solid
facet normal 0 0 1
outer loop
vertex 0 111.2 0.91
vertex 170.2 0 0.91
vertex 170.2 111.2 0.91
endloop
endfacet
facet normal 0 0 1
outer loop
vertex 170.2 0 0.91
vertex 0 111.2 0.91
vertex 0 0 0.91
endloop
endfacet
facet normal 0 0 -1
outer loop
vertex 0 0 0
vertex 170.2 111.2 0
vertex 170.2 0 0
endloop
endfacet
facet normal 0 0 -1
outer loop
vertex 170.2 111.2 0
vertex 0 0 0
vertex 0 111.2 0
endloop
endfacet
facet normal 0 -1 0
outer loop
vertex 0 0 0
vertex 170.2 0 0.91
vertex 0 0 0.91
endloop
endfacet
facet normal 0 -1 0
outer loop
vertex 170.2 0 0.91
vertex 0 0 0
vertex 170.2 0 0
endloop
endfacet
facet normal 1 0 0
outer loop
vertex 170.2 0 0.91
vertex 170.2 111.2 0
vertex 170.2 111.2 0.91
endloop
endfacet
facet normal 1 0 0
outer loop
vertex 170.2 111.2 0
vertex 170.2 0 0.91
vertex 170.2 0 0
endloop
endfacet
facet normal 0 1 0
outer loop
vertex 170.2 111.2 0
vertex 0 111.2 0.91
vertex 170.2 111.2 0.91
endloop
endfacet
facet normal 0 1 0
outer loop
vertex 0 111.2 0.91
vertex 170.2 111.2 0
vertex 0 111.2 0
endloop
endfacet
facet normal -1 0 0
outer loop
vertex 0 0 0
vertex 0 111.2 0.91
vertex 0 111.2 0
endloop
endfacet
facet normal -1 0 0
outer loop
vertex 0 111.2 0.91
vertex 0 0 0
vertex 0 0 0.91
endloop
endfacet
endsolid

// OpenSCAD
// file: common.scad
include	<../common/constants.scad>

// A(x0, y0), B(x1, y1), C(x2, y2) 에서 A와 직선 BC 사이 거리 계산
function pointToLineDistance(x0, y0, x1, y1, x2, y2) =
    abs((x2 - x1)*(y1 - y0) - (x1 - x0)*(y2 - y1)) /
    sqrt((x2 - x1)*(x2 - x1) + (y2 - y1)*(y2 - y1));

module hr() {
	echo(HR);
}
module arrow_left(v) {
	leader = v.y / 32;	//	지시선 두께
	polygon([
		[0, 0],
		[leader, 0],
		[leader, v.y],
		[0, v.y]
	]);

	shaft = v.y / 24;	//	화살대 두께
	polygon([
		[0,		v.y / 2],
		[v.y,	0],
		[v.y,	v.y / 2 - shaft],
		[v.y,	v.y / 2 + shaft],
		[v.y,	v.y],

		[v.x,	v.y / 2 - shaft],
		[v.x,	v.y / 2 + shaft]
	],
	paths=[[0, 1, 2, 5, 6, 3, 4]]);
}
module arrow_right(v) {
	translate(v)
	rotate([0, 0, 180])
	arrow_left(v);
}
module arrow_up(v) {
	translate([0, v.y])
	rotate([0, 0, -90])
	arrow_left([v.y, v.x]);
}
module arrow_down(v) {
	translate([v.x, 0])
	rotate([0, 0, 90])
	arrow_left([v.y, v.x]);
}

module notateHI(v, title) {
	titleSize = v.y * len(title);

	arrow_left([(v.x - titleSize) / 2, v.y]);

	translate([v.x - (v.x - titleSize) / 2, 0])
	arrow_right([(v.x - titleSize) / 2, v.y]);

	translate([v.x / 2, 0])
	text(title, font = "D2Coding", size = v.y, halign = "center");
}
module notateHO(v, title) {
	titleSize = v.y * len(title);
	arrowSize = v.y * 3;

	translate([-arrowSize, 0])
	arrow_right([arrowSize, v.y]);

	translate([v.x, 0])
	arrow_left([arrowSize, v.y]);

	translate([v.x / 2, 0])
	text(title, font = "D2Coding", size = v.y, halign = "center");
}
module notateH(v, title, up, prefix) {
	prefixSafe = is_undef(prefix) ? "" : prefix;
	titleDetail = is_undef(title) ? str(prefixSafe, v.x, "mm") : title;
	titleShort = is_undef(title) ? str(prefixSafe, v.x) : title;
	titleDetailSize = v.y * len(titleDetail);
	titleShortSize = v.y * len(titleShort);
	
	arrowSize = v.y * 3;

	titleSafe = is_undef(title) ? str(v.x) : title;
	upSafe = is_undef(up) ? true : false;
	%linear_extrude(height = EPSILON) {
		if (v.x >= (arrowSize * 2 + titleDetailSize)) {
			// 화살표, 단위까지 충분히 들어간다
			notateHI(v, titleDetail);
		} else if (v.x >= (arrowSize * 2 + titleShortSize)) {
			// 화살표는 들어갈 수 있으나, 단위까지는 못 들어간다
			notateHI(v, titleShort);
		} else if (v.x >= titleDetailSize) {
			//	화살표는 못들어가나, 단위는 들어간다
			notateHO(v, titleDetail);
		} else if (v.x >= titleShortSize) {
			//	화살표는 못들어가나, 수치는 들어간다
			notateHO(v, titleShort);
		} else {
			// 바깥에 표시해야 한다
			notateHO(v, "");
			if (upSafe) {
				translate([v.x / 2, v.y])
				text(titleDetail, font = "D2Coding", size = v.y, halign = "center");
			} else {
				translate([v.x / 2, -v.y])
				text(titleDetail, font = "D2Coding", size = v.y, halign = "center");
			}
		}
	}
}
module notateV(v, title, up, prefix) {
	translate([v.x, 0])
	rotate([0, 0, 90])
	notateH([v.y, v.x], title, up, prefix);
}
module notate(v, title, up, prefix) {
//	echo(str(parent_module(0), ".", parent_module(1), "(", v, title, up, prefix, ")"));

	assert(!is_undef(v));
	assert(!is_undef(v[1]));

	if (v.x > v.y) {
		notateH(v, title, up, prefix);
	} else {
		notateV(v, title, up, prefix);
	}
}
module test() {
	// 테스트
	x0 = 2; y0 = 2;    // 점 A
	x1 = 0; y1 = 0;    // 점 B
	x2 = 4; y2 = 0;    // 점 C

	distance = pointToLineDistance(x0, y0, x1, y1, x2, y2);
	hr();
	echo("A에서 BC까지의 거리: ", distance);
	hr();
}
module main() {
	SHORT = 20;
	//notate([32, 16], str(32, "mm"));
	//notateH([3, 4]);
	notate([13, 4]);
	arrow_left([8, 2]);

	test();
}

main();
// file: ../common/constants.scad
// 상수들 정의
// include 사용하시오
MAX = [220, 220, 250];
ZERO = [0, 0, 0];
HALF = [1/2, 1/2, 1/2];
ONE = [1, 1, 1];
BIG = [1024, 1024, 1024];
EPSILON = 0.01;
EPSILON2 = EPSILON * 2;
MINIMUM = 0.1;	//	0.1mm
NOZZLE = 0.4;	//	노즐 지름
OVERHANG_THRESHOLD = 30;
HR = "──────────────────────────────────";
DIGIT = "①②③④⑤⑥⑦⑧⑨⑩⑪⑫⑬⑭⑮⑯⑰⑱⑲⑳";
UPPER = "ⒶⒷⒸⒹⒺⒻⒼⒽⒾⒿⓀⓁⓂⓃⓄⓅⓆⓇⓈⓉⓊⓋⓌⓍⓎⓏ";
LOWER = "ⓐⓑⓒⓓⓔⓕⓖⓗⓘⓙⓚⓛⓜⓝⓞⓟⓠⓡⓢⓣⓤⓥⓦⓧⓨⓩ";

FN = $preview ? 16 : 360;

//	자원들
RADIUS_HOLE_NUT_25 = 3.4 / 2;	//	검은색 25mm 나사 너트 구멍 반지름
// main file
// 라이브러리, 검증된 것만 이곳에
include	<../common/constants.scad>
use <common.scad>

function PART02() = [
	[170.20, 111.20, 0.91, "부품의 크기", "sizeDisplayPanel"],
	[5.10, 4.70, "Active Area의 상대적 위치 = 좌상단의 여백", "marginActiveArea"],
	"화면 부품. Display Panel"
];
COLOR02 = [0.5, 0.5, 0.1, 0.9];

module epaper_part_02() {
	echo(str(parent_module(0), "(", ")"));

	p2 = PART02();

	sizeDisplayPanel = [ for (cx = [0:2]) p2[0][cx] ];
	marginActiveArea = p2[1];
	echo(str(parent_module(0)), sizeDisplayPanel, marginActiveArea);

	//	Panel
	color(COLOR02)
	cube(sizeDisplayPanel);

	pNotate = [marginActiveArea.x + - 8, (sizeDisplayPanel.y - 8) - marginActiveArea.y];

	//	왼쪽 테두리
	translate([0, pNotate.y, sizeDisplayPanel.z])
	notate([marginActiveArea.x, 2], str(marginActiveArea.x, "mm"));

	//	오른쪽 테두리
	translate([pNotate.x + 8, pNotate.y, sizeDisplayPanel.z])
	notate([marginActiveArea.x, 2], str(marginActiveArea.x, "mm"));

	//	위쪽 테두리
	translate([pNotate.x, sizeDisplayPanel.y - marginActiveArea.y, sizeDisplayPanel.z])
	notate([2, marginActiveArea.y]);

	//	아래쪽 테두리
	translate([pNotate.x, 0, sizeDisplayPanel.z])
	notate([2, sizeDisplayPanel.y - marginActiveArea.y]);

	fs = 2;
	%translate([sizeDisplayPanel.x / 2, sizeDisplayPanel.y - fs, EPSILON])
	linear_extrude(height = sizeDisplayPanel.z) {
		text(str(parent_module(0), p2[0], p2[2]), font = "D2Coding", size = fs, halign = "center");
	}
}
module main() {
	epaper_part_02();
}

main();
